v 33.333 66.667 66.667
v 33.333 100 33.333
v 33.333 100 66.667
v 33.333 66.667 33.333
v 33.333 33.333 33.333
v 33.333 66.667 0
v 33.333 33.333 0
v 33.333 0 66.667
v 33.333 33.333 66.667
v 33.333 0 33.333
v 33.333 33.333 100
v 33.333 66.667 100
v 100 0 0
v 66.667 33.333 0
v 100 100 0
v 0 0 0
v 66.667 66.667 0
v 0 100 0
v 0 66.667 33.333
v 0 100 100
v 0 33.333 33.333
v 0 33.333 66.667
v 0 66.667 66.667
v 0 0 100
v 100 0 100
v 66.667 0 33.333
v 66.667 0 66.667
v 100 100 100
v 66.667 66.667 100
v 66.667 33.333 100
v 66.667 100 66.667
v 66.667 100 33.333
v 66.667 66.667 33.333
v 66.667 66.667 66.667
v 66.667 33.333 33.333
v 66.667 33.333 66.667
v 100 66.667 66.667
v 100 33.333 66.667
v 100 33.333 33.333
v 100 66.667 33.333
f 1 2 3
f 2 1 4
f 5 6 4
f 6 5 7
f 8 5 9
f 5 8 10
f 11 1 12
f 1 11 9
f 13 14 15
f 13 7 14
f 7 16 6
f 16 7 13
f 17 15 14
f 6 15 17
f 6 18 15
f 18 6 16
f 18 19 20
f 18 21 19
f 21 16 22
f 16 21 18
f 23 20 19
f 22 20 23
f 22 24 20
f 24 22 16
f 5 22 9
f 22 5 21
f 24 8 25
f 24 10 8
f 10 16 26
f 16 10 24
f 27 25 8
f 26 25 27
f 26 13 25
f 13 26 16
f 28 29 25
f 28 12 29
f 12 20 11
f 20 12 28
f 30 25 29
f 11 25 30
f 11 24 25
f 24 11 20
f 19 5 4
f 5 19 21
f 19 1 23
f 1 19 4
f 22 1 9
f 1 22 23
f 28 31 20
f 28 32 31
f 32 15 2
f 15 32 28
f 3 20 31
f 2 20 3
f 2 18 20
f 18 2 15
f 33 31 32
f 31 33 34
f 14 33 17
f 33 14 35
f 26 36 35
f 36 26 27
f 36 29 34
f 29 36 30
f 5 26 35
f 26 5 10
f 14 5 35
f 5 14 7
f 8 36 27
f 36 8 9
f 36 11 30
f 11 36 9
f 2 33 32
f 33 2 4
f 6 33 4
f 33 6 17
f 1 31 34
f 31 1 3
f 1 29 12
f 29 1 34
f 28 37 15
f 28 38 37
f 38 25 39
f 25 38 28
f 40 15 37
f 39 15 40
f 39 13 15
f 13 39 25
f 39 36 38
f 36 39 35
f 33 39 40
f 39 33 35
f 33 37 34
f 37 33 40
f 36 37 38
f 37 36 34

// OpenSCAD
module sierpinski_cube(level, size){
    if (level == 0) {
        cube(size);
    } else {
        new_size=size/3;
        new_level=level-1;
        for(i=[0:2]){
            for(j=[0:2]){
                for(k=[0:2]){
                    if((i!=1||j!=1)&&(j!=1||k!=1)&&(k!=1||i!=1)){
                        translate([new_size*i,new_size*j,new_size*k]){
                            sierpinski_cube(new_level, new_size);
                        }
                    }
                }
            }
        }
    }
}

level = 1;
size = 100;
sierpinski_cube(level, size);
